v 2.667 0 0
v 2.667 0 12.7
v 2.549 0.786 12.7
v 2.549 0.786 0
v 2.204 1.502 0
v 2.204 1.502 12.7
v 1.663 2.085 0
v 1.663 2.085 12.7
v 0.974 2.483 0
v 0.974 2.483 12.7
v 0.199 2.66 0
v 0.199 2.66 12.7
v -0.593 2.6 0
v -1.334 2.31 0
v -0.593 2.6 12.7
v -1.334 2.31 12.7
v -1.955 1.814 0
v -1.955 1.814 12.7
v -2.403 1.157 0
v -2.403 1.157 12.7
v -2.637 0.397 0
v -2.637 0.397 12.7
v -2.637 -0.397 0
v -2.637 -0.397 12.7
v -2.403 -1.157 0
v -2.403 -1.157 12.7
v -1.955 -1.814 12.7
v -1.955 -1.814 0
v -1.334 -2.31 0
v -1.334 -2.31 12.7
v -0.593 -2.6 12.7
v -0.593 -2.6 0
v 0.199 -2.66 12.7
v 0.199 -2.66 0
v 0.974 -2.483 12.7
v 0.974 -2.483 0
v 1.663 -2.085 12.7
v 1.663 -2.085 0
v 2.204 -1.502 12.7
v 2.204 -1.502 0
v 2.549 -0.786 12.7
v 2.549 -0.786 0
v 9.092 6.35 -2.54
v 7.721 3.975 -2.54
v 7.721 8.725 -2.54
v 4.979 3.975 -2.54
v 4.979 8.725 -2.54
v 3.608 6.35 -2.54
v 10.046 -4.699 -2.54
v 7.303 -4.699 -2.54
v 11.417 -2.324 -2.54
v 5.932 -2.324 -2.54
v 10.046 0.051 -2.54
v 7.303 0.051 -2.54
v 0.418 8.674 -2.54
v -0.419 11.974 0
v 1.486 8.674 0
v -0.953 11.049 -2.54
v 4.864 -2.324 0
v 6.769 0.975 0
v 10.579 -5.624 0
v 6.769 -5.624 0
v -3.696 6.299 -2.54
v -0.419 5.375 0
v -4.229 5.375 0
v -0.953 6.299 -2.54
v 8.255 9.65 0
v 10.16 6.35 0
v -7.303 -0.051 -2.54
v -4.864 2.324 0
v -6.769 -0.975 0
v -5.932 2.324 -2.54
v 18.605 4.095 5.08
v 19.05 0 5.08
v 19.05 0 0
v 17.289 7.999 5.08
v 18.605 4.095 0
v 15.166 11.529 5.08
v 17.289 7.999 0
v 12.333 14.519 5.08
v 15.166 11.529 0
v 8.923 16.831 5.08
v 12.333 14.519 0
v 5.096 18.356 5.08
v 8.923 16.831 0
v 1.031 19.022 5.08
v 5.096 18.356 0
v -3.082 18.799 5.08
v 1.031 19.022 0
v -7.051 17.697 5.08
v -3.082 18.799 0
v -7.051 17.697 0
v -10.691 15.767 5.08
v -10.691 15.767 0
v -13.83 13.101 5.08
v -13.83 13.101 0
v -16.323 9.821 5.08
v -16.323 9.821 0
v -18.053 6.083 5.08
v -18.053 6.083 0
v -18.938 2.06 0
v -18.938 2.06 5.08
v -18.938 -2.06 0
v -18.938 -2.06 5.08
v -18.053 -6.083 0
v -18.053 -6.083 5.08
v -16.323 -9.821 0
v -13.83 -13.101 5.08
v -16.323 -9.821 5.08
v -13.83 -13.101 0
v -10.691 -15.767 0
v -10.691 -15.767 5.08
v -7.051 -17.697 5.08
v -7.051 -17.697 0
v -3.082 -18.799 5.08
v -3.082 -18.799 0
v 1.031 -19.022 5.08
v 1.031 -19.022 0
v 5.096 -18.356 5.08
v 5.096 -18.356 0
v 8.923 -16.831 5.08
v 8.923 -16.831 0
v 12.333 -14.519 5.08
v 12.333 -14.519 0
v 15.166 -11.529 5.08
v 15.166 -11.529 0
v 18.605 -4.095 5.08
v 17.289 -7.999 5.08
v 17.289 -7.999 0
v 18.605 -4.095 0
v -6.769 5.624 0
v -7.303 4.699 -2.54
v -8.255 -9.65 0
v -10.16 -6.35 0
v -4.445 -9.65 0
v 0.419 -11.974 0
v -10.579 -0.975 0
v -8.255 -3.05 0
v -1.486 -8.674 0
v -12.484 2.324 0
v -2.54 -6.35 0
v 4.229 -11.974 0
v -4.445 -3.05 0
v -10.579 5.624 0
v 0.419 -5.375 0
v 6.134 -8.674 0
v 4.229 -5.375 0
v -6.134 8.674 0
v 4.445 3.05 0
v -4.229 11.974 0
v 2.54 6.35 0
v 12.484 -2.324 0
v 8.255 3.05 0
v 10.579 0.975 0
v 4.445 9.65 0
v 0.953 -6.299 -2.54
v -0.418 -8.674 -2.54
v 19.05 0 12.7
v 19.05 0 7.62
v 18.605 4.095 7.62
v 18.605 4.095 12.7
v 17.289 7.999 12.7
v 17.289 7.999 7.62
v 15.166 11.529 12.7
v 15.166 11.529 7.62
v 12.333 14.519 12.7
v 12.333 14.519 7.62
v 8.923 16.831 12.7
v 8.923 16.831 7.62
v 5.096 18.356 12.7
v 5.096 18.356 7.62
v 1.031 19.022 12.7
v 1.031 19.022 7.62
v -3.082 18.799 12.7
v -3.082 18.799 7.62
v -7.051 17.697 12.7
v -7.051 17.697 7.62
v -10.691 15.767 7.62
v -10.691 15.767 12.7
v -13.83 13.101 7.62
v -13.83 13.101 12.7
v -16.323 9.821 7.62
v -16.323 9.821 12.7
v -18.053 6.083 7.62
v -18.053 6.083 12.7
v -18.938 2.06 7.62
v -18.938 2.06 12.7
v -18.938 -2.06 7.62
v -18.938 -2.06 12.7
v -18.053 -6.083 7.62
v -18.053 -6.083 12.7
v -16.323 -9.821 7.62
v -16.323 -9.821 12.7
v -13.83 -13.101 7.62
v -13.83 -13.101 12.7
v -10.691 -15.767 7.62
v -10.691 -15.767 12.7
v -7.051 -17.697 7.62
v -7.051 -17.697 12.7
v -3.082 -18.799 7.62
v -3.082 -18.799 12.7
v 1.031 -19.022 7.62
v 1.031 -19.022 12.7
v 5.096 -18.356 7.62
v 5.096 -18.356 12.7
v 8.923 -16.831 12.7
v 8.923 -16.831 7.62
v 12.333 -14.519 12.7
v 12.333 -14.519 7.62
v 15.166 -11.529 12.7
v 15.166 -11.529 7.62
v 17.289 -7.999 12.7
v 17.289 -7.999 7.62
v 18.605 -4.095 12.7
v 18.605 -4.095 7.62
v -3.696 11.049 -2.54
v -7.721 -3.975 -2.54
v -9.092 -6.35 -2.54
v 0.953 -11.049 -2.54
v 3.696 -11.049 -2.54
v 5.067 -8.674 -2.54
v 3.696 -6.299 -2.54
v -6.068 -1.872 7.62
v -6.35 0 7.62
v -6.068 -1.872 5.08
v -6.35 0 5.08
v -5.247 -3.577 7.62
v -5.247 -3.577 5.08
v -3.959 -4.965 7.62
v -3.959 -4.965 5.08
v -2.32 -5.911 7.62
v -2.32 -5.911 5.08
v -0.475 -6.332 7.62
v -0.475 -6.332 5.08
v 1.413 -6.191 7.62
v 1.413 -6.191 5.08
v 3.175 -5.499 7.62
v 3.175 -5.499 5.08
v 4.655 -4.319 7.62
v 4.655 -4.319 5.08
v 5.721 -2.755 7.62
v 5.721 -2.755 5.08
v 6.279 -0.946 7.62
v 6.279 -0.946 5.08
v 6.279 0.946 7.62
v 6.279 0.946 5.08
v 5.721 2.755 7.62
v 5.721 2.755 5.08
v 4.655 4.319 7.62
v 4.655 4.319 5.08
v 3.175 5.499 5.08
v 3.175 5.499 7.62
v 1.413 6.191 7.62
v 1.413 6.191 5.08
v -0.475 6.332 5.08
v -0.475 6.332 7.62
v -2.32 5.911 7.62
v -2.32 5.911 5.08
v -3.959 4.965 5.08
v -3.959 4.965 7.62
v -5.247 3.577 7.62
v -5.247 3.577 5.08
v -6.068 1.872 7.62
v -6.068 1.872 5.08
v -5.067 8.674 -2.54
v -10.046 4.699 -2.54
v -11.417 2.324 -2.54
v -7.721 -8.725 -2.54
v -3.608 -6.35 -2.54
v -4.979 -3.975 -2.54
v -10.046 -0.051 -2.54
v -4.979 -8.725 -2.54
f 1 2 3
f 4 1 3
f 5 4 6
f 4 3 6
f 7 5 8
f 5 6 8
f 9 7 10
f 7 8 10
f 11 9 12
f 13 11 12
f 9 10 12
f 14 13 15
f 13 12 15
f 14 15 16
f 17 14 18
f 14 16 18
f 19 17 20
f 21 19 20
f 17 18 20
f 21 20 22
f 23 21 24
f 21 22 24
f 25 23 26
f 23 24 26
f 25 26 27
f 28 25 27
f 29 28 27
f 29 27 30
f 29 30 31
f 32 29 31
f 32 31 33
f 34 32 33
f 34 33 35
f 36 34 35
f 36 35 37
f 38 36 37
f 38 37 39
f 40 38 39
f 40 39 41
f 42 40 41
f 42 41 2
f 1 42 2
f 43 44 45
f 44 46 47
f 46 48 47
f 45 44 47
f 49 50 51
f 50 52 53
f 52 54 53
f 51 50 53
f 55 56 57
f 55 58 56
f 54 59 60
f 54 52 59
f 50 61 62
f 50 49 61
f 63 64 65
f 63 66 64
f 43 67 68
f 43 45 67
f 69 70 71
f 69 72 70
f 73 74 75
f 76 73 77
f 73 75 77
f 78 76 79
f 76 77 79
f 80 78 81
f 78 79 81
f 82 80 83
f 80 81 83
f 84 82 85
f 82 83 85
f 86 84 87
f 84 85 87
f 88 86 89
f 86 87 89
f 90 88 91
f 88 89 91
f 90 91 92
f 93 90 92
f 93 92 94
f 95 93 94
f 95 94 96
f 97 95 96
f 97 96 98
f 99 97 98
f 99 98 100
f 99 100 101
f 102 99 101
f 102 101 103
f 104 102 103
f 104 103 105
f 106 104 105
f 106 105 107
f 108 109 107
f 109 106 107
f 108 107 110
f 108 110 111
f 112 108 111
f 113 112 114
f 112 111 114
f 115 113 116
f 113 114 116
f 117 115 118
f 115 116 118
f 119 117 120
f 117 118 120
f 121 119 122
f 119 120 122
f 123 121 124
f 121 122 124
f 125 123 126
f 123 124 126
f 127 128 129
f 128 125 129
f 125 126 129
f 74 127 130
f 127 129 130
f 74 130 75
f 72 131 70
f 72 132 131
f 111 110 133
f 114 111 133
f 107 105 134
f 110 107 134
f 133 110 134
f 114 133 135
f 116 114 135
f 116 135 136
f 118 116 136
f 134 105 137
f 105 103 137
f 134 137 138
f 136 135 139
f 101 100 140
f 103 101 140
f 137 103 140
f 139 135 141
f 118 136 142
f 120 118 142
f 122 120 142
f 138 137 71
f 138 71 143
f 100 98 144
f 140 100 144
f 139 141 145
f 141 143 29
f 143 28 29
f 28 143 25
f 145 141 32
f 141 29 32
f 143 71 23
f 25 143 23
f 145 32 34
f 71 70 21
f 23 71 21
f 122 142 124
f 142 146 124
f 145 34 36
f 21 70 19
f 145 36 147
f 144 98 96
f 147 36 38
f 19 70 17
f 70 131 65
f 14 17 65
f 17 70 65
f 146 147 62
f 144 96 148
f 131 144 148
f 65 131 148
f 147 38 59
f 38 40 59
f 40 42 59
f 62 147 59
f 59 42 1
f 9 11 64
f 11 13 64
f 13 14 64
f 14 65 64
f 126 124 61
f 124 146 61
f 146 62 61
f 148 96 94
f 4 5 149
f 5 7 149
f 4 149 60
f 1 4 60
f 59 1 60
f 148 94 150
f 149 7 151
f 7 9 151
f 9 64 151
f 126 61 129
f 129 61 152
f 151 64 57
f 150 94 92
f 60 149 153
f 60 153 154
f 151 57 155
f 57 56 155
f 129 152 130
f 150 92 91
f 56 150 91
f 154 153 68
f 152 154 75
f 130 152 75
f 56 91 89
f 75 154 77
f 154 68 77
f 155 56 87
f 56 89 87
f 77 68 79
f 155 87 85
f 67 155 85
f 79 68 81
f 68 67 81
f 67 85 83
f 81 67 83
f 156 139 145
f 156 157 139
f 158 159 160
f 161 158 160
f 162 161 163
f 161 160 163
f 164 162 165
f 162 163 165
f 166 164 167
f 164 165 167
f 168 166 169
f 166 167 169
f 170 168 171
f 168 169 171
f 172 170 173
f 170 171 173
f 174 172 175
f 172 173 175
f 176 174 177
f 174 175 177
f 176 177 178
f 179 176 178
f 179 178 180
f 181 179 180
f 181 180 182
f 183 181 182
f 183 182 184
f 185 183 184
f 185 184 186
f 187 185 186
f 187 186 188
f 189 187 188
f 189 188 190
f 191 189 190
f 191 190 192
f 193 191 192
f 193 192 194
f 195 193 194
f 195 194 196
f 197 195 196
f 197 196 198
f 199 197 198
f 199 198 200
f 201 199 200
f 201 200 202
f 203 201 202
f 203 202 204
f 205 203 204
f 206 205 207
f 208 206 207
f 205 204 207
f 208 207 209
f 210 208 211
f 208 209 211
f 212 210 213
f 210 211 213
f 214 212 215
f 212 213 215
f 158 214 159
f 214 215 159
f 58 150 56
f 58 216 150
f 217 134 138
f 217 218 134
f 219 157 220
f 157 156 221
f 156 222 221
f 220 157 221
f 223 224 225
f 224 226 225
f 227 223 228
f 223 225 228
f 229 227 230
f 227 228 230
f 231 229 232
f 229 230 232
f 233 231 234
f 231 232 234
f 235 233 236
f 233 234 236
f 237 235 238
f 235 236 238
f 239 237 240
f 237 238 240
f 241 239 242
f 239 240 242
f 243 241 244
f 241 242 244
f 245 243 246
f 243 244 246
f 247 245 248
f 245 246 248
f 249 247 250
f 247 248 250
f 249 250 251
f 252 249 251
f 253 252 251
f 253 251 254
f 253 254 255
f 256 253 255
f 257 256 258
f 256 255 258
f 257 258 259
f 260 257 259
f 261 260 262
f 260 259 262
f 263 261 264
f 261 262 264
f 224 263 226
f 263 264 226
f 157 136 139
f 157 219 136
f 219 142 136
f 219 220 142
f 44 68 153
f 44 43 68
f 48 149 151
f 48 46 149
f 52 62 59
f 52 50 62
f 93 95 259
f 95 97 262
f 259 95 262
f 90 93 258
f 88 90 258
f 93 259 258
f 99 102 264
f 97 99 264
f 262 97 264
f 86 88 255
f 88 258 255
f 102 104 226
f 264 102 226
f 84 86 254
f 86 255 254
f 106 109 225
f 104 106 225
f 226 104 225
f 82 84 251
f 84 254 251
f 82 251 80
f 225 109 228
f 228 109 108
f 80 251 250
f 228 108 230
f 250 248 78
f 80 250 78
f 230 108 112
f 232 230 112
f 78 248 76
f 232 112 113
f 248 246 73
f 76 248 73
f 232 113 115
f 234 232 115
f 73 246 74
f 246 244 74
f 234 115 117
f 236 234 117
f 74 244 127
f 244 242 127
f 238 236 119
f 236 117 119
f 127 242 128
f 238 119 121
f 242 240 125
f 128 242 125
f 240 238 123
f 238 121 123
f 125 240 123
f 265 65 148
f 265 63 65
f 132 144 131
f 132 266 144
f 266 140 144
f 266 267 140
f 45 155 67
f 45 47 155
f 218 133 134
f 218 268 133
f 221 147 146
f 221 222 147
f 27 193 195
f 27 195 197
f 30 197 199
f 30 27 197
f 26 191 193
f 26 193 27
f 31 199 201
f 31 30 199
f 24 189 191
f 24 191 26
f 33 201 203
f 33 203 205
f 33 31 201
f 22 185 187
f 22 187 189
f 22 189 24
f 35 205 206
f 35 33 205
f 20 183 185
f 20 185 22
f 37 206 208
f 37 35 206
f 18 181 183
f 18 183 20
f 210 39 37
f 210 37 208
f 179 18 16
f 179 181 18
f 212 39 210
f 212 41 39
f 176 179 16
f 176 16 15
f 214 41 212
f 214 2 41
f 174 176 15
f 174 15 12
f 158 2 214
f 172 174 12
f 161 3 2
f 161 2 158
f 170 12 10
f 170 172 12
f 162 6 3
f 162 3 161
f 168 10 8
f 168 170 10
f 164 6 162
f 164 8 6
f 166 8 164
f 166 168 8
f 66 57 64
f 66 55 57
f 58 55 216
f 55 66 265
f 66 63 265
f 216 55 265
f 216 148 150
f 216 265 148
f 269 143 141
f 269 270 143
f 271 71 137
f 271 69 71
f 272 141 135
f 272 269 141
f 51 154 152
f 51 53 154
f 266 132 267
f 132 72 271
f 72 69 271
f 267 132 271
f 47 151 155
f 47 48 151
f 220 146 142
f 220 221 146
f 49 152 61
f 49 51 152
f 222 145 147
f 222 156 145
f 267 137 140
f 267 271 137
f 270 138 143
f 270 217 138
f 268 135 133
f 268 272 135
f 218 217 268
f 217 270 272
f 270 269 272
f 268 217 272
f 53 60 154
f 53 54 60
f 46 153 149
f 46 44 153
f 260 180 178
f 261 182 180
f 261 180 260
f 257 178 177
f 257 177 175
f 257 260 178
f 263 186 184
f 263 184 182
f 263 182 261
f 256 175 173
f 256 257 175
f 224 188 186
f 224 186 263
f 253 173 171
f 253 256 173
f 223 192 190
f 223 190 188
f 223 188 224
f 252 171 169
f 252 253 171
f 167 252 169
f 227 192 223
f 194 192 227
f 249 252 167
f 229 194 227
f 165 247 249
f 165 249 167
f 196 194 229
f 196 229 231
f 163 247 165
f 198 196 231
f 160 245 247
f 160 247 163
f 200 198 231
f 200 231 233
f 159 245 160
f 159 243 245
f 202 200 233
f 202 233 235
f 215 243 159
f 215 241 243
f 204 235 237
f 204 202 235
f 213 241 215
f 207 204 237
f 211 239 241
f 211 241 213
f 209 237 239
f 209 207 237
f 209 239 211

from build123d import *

# Parameters (mm, degrees)
SKETCH1_R           = 19.05
BOSS_EXTRUDE1_DEPTH = 12.7
SKETCH2_W           = 12.7
SKETCH2_H           = 2.54
SKETCH3_R           = 2.667
CUT_EXTRUDE1_DEPTH  = 30.784140075
BOSS_EXTRUDE2_DEPTH = 2.54
BOSS_EXTRUDE2_TAPER = 20
CIRPATTERN1_COUNT   = 6


with BuildPart() as part:
    # Sketch1 → Boss-Extrude1 (new body)
    with BuildSketch(Plane.XY):
        Circle(SKETCH1_R)
    extrude(amount=BOSS_EXTRUDE1_DEPTH)

    # Sketch2 → Cut-Revolve1 (revolve, cut)
    with BuildSketch(Plane(origin=(0, 0, 0), x_dir=(1, 0, 0), z_dir=(0, 1, 0)), mode=Mode.PRIVATE) as cut_revolve1_sk:
        with Locations((12.7, -6.35)):
            Rectangle(SKETCH2_W, SKETCH2_H)
    revolve(cut_revolve1_sk.sketch.rotate(Axis((0, 0, 0), (0, 0, 1)), 180), axis=Axis((0, 0, 0), (0, 0, 1)), mode=Mode.SUBTRACT)

    # Sketch3 → Cut-Extrude1 (cut, through all)
    with BuildSketch(Plane.XY.offset(12.7)):
        Circle(SKETCH3_R)
    extrude(amount=-CUT_EXTRUDE1_DEPTH, mode=Mode.SUBTRACT)

    # Sketch4 → Boss-Extrude2 (add)
    with BuildSketch(Plane(origin=(0, 0, 0), x_dir=(-1, 0, 0), z_dir=(0, 0, -1))):
        Polygon((-4.445, 3.050443212), (-2.54, 6.35), (-4.445, 9.649556788), (-8.255, 9.649556788), (-10.16, 6.35), (-8.255, 3.050443212), align=None)
    boss_extrude2 = extrude(amount=BOSS_EXTRUDE2_DEPTH, taper=BOSS_EXTRUDE2_TAPER)

    # CirPattern1: Boss-Extrude2 ×6 about axis
    cirpattern1_axis = Axis((0, 0, 0), (0, 0, 1))
    for i in range(1, CIRPATTERN1_COUNT):
        add(boss_extrude2.rotate(cirpattern1_axis, i * 360 / CIRPATTERN1_COUNT))


solid = part.part
